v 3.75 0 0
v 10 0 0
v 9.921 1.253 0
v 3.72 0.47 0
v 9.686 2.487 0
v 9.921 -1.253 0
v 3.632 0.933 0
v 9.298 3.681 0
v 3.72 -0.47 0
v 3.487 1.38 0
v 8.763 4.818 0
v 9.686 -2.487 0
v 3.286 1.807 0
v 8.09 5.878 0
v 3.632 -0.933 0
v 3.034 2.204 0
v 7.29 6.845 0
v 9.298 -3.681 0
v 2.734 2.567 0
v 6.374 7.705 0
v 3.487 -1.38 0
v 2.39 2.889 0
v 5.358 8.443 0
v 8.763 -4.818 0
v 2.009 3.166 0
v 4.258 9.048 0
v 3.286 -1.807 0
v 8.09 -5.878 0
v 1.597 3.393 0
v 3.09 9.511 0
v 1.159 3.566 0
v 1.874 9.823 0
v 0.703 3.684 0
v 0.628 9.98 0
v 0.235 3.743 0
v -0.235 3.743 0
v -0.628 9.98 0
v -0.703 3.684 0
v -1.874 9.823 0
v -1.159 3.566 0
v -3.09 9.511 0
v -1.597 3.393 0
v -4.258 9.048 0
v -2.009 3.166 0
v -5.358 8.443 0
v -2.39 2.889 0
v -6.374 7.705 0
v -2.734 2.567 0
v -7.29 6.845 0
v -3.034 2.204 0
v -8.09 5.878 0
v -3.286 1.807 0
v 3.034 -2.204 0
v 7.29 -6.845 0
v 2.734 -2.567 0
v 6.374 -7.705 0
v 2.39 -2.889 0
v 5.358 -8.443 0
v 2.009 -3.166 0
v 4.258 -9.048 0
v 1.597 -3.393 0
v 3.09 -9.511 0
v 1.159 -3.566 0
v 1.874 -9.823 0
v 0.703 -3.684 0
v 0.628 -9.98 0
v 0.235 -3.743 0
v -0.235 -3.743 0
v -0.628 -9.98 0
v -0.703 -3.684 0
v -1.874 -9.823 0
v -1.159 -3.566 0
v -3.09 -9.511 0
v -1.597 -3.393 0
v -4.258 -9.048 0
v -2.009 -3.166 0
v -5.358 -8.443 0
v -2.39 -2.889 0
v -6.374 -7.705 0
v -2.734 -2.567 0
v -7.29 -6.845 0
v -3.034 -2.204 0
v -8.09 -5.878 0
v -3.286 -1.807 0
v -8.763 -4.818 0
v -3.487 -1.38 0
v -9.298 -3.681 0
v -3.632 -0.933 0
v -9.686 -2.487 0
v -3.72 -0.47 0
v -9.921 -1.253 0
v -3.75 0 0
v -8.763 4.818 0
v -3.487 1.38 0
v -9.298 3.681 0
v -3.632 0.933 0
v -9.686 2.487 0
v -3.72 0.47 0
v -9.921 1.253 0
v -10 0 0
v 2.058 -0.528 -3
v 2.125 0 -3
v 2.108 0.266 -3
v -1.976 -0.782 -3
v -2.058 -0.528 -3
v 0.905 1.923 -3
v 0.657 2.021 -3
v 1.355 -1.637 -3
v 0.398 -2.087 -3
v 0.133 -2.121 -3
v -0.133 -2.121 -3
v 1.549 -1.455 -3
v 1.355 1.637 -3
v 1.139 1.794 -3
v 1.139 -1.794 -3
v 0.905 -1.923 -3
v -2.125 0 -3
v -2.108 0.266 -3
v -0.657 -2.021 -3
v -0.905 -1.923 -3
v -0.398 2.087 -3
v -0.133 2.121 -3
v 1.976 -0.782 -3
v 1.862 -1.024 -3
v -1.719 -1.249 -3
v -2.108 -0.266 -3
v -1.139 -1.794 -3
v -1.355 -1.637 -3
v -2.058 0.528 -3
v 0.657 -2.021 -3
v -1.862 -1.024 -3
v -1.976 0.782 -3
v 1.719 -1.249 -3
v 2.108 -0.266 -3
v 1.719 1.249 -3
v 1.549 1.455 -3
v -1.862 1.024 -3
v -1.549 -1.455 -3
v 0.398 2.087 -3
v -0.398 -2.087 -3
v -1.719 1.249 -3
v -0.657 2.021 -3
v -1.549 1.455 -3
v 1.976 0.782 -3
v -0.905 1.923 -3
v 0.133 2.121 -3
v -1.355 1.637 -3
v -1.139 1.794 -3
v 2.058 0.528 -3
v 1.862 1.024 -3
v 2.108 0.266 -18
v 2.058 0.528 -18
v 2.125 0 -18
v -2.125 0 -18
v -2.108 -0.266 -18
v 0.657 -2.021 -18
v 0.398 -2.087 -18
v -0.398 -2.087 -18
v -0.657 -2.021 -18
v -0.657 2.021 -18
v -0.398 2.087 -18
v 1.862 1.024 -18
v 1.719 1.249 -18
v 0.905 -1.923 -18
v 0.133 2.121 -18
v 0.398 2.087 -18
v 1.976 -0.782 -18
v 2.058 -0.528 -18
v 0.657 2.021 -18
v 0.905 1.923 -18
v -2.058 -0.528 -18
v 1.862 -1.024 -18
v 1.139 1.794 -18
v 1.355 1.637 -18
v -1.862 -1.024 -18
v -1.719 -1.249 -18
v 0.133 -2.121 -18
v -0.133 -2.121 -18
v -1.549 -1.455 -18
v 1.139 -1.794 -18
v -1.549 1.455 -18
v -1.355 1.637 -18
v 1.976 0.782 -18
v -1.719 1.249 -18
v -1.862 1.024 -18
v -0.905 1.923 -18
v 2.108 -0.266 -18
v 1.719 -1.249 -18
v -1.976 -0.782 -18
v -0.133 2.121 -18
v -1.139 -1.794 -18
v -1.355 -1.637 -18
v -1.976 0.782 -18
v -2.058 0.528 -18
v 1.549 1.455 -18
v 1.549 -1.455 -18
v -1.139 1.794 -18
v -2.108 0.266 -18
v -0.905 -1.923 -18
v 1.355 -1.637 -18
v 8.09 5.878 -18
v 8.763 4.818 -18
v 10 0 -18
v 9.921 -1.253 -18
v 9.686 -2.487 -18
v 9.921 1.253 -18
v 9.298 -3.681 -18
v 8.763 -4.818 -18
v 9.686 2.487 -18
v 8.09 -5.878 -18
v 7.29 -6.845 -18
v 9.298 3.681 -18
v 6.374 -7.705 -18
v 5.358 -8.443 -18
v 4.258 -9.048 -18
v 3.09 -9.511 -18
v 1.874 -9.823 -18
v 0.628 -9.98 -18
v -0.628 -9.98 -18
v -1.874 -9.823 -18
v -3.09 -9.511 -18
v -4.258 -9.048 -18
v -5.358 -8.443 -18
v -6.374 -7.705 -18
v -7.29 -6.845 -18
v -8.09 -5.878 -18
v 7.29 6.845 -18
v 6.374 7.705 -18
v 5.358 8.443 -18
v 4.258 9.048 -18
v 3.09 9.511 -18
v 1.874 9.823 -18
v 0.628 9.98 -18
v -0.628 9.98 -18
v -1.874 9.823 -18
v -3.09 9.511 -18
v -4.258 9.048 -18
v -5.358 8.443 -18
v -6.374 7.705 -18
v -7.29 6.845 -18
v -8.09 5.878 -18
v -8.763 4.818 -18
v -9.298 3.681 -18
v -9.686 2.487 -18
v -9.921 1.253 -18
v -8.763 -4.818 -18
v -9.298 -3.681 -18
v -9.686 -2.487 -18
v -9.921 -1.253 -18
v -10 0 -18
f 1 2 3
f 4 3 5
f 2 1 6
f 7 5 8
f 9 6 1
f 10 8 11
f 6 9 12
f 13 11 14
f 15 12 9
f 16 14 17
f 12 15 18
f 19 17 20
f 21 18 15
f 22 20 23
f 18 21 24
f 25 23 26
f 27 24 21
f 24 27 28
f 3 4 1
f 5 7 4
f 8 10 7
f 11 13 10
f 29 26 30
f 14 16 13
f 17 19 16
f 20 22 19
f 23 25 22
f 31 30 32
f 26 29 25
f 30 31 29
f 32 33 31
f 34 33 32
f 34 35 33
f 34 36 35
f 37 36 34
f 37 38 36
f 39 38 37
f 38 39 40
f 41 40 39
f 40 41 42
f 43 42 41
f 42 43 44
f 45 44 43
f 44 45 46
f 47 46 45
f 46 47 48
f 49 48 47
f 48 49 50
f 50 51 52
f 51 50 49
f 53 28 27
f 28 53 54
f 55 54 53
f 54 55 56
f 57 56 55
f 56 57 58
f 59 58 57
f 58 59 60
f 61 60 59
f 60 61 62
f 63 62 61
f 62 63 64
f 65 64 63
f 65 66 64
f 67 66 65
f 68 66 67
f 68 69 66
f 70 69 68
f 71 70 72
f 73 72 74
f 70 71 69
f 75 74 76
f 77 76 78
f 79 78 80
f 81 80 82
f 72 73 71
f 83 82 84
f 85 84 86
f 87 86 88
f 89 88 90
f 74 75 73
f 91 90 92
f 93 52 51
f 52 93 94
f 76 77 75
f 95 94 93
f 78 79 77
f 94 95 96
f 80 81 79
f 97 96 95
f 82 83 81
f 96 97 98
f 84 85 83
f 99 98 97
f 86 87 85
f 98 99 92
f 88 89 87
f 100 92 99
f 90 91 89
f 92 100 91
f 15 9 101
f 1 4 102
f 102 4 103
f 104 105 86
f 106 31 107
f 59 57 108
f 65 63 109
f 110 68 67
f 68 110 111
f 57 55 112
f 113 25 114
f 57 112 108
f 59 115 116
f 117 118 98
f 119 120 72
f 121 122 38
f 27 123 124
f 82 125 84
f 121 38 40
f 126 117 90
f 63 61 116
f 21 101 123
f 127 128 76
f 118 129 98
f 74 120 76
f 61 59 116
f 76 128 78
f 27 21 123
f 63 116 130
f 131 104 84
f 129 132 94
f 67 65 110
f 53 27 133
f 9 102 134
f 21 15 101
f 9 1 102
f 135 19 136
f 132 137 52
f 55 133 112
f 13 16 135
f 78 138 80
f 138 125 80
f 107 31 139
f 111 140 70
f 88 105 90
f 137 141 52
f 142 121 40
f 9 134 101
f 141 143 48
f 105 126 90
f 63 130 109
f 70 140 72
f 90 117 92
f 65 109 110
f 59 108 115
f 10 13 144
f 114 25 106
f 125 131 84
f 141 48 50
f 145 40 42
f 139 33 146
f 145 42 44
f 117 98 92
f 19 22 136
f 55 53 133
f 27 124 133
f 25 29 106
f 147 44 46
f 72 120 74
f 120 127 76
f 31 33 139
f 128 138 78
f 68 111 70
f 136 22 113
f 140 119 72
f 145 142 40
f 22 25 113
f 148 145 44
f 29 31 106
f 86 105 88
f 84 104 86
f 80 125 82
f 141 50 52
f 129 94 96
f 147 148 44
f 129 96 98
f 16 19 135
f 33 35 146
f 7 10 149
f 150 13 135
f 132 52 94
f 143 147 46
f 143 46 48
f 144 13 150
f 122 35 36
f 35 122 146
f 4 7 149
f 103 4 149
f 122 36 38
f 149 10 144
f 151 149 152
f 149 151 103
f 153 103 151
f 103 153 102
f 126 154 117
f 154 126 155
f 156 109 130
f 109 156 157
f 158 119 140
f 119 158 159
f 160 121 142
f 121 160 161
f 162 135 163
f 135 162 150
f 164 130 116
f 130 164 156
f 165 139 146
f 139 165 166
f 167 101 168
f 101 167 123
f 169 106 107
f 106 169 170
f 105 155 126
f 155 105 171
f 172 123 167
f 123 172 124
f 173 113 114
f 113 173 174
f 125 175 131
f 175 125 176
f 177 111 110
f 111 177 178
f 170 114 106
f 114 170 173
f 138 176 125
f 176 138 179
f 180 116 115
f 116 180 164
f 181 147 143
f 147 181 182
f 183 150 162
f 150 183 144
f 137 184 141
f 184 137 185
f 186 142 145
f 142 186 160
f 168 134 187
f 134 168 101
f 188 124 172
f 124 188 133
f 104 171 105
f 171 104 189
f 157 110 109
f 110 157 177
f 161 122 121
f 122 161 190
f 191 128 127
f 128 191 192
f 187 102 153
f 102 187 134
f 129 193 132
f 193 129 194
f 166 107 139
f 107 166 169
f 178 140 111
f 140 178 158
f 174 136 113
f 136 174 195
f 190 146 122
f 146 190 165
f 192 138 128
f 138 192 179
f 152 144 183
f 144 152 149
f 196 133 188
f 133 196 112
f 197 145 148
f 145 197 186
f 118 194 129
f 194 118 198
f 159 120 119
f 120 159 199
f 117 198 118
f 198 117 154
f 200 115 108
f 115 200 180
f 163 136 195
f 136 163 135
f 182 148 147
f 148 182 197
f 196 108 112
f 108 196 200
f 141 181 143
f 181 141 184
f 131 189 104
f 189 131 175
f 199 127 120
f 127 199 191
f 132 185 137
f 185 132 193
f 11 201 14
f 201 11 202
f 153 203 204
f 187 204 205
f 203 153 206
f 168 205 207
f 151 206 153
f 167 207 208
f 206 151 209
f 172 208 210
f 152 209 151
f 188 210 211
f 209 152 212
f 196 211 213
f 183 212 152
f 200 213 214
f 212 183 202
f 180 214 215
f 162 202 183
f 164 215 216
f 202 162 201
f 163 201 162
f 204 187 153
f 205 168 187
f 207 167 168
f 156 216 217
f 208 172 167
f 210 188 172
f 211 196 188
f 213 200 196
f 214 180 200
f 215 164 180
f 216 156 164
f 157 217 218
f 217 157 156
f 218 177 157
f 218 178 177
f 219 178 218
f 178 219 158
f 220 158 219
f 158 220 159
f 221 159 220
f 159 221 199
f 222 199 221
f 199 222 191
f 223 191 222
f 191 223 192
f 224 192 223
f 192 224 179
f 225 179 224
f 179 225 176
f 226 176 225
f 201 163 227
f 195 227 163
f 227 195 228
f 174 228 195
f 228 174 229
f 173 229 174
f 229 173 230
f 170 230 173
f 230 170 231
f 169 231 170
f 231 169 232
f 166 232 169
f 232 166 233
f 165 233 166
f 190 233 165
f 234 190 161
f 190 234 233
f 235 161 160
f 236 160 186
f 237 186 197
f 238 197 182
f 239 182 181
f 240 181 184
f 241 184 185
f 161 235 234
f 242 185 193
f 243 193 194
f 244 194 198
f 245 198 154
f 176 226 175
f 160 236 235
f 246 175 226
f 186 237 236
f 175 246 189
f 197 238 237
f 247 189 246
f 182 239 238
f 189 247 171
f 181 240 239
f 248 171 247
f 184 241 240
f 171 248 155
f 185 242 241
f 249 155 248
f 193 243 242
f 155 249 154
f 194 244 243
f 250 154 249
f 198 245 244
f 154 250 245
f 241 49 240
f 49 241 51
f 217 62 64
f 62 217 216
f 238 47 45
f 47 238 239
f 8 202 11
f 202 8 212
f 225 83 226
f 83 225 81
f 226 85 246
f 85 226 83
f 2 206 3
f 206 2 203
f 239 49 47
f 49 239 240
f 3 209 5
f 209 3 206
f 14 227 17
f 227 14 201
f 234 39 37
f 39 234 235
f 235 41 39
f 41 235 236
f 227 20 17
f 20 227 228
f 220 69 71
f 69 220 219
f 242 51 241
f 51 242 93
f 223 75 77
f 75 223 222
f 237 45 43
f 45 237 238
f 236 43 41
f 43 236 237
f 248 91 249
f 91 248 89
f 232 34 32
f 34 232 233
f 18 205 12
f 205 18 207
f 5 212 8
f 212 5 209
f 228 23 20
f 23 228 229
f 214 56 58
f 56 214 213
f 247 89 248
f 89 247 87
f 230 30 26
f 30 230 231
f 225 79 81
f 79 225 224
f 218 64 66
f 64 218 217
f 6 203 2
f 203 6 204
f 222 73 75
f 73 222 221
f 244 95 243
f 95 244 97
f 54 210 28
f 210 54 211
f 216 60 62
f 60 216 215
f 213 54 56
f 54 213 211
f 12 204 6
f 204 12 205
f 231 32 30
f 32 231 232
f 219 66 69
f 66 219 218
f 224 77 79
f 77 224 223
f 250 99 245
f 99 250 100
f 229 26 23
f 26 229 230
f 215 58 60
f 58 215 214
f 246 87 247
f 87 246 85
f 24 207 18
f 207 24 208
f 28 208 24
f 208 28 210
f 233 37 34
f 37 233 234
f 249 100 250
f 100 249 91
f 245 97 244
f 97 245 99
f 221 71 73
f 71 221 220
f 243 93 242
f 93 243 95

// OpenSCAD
$fn = 50;

difference() {
	union() {
		translate(v = [0, 0, -18.0]) {
			cylinder(h = 18, r = 10.0);
		}
	}
	union() {
		translate(v = [0, 0, 0]) {
			rotate(a = [0, 0, 0]) {
				difference() {
					union() {
						translate(v = [0, 0, -21.0]) {
							cylinder(h = 21, r = 2.0);
						}
						translate(v = [0, 0, -3]) {
							cylinder(h = 3, r1 = 2.125, r2 = 3.75);
						}
						translate(v = [0, 0, -21.0]) {
							cylinder(h = 21, r = 2.125);
						}
						translate(v = [0, 0, -21.0]) {
							cylinder(h = 21, r = 2.0);
						}
					}
					union();
				}
			}
		}
	}
}
